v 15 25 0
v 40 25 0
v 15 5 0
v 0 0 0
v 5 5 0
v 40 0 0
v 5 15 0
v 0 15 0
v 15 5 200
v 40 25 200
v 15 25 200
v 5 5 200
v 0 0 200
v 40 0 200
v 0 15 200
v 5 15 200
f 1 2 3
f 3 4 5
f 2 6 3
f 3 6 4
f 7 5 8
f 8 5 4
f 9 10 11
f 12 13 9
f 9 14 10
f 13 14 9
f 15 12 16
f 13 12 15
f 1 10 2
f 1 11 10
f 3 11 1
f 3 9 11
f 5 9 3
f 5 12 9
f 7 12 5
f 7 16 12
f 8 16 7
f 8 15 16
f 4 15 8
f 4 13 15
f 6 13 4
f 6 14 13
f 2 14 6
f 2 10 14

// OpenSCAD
/*
CarrageShield
2/23/2020
This is a shield that fits on the carrage to trigger passage counters

CarrageShell is the cover over the electronics. This CarrageShield will
hook onto the CarrageShell. the thickness of the CarrageShield presses against the
trigger.

*/
//CarrageShieldSide = CSS_
x0=0;
y0=0;
CSS_FullWidth = 40; //x1
CSS_FaceDepth = 20; //x2
CSS_ClaspWall = 5;  //x4
CSS_ShellWall = CSS_FullWidth - (CSS_FaceDepth + CSS_ClaspWall); //x3
echo(CSS_ShellWall=CSS_ShellWall);

CSS_FaceHeight = 25;        //y1
CSS_ClaspBaseHeight = 5;    //y2
CSS_ClaspFullHeight = CSS_FaceHeight - CSS_ClaspBaseHeight; //y3
CSS_ClaspHeight = CSS_ClaspFullHeight - CSS_ClaspBaseHeight; //y4

CSS_FaceWidth = 200; //z1

x1 = CSS_FullWidth;
x2 = CSS_FaceDepth;
x3 = CSS_ShellWall;
x4 = CSS_ClaspWall;

y1 = CSS_FaceHeight;
y2 = CSS_ClaspBaseHeight;
y3 = CSS_ClaspFullHeight;
y4 = CSS_ClaspHeight;

z1 = CSS_FaceWidth;

CSS_Polygon = [[x0,y0],[x1,y0], [x1,y1], [x3, y1], [x3, y2], [x4, y2], [x4, y4], [x0, y4]];
echo(CSS_Polygon=CSS_Polygon);

linear_extrude(height=z1)
polygon(CSS_Polygon);
